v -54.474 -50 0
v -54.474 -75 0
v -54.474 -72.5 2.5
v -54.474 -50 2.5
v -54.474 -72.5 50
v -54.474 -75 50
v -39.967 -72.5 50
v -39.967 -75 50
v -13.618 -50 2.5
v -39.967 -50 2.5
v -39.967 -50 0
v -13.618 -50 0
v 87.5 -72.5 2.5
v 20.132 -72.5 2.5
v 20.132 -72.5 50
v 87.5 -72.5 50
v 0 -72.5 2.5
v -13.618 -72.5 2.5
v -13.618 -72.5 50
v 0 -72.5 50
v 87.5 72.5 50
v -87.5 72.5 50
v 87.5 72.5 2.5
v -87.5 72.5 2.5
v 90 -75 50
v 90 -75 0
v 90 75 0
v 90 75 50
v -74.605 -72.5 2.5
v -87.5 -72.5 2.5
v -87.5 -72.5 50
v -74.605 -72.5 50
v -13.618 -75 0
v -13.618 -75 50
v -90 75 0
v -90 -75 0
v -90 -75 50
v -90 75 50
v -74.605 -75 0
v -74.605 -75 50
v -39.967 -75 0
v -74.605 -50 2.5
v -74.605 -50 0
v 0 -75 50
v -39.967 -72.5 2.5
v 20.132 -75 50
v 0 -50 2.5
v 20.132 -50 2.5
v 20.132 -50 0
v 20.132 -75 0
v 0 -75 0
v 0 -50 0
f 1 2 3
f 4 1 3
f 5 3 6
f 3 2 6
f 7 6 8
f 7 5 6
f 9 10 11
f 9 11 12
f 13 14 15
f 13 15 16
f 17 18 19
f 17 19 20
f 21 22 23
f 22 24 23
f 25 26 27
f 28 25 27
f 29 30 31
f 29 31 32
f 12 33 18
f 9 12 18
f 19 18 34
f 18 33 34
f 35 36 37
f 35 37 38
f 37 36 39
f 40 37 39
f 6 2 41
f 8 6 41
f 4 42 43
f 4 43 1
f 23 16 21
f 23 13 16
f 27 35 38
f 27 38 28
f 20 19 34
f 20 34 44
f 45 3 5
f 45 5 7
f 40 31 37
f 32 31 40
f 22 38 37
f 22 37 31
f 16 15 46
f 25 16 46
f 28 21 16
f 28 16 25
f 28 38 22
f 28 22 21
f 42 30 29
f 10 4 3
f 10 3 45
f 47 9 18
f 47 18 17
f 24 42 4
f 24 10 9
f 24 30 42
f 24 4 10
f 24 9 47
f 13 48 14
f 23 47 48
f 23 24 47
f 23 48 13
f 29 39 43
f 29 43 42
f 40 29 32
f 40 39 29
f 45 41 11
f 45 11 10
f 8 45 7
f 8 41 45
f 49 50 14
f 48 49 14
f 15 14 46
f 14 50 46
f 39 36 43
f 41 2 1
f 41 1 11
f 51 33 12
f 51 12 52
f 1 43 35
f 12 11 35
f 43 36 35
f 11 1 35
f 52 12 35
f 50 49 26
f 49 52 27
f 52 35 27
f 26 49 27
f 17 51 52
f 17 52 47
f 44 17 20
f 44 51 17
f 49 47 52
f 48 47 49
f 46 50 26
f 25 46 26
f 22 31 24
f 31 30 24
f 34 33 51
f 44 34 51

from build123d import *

# Parameters (mm, degrees)
F0_W      = 180
F0_H      = 150
F1_DEPTH  = 50
F2_T      = -2.5
F3_W      = 20.1315768063
F3_H      = 50
F4_DEPTH  = 25
F5_W      = 20.1315768063
F5_H      = 50
F6_DEPTH  = 25
F7_W      = 20.131578669
F7_H      = 50
F8_DEPTH  = 25
F9_W      = 6.2171062455
F9_H      = 50
F10_DEPTH = 25


with BuildPart() as f1:
    # F0 (on Top) → F1 (new body)
    with BuildSketch(Plane.XY):
        Rectangle(F0_W, F0_H)
    extrude(amount=F1_DEPTH)

    # F2
    f2_openings = [f1.faces().sort_by_distance(p)[0] for p in [
        (0, 0, 50),
    ]]
    offset(amount=F2_T, openings=f2_openings)

    # F3 (on face) → F4 (cut)
    with BuildSketch(Plane.XZ.offset(75)):
        with Locations((-64.5394753665, 25)):
            Rectangle(F3_W, F3_H)
    extrude(amount=-F4_DEPTH, mode=Mode.SUBTRACT)

    # F5 (on face) → F6 (cut)
    with BuildSketch(Plane.XZ.offset(75)):
        with Locations((-29.9013163894, 25)):
            Rectangle(F5_W, F5_H)
    extrude(amount=-F6_DEPTH, mode=Mode.SUBTRACT)

    # F7 (on face) → F8 (cut)
    with BuildSketch(Plane.XZ.offset(75)):
        with Locations((10.0657893345, 25)):
            Rectangle(F7_W, F7_H)
    extrude(amount=-F8_DEPTH, mode=Mode.SUBTRACT)

    # F9 (on face) → F10 (cut)
    with BuildSketch(Plane.XZ.offset(75)):
        with Locations((-16.7269748636, 25)):
            Rectangle(F9_W, F9_H)
    extrude(amount=-F10_DEPTH, mode=Mode.SUBTRACT)


solid = f1.part
